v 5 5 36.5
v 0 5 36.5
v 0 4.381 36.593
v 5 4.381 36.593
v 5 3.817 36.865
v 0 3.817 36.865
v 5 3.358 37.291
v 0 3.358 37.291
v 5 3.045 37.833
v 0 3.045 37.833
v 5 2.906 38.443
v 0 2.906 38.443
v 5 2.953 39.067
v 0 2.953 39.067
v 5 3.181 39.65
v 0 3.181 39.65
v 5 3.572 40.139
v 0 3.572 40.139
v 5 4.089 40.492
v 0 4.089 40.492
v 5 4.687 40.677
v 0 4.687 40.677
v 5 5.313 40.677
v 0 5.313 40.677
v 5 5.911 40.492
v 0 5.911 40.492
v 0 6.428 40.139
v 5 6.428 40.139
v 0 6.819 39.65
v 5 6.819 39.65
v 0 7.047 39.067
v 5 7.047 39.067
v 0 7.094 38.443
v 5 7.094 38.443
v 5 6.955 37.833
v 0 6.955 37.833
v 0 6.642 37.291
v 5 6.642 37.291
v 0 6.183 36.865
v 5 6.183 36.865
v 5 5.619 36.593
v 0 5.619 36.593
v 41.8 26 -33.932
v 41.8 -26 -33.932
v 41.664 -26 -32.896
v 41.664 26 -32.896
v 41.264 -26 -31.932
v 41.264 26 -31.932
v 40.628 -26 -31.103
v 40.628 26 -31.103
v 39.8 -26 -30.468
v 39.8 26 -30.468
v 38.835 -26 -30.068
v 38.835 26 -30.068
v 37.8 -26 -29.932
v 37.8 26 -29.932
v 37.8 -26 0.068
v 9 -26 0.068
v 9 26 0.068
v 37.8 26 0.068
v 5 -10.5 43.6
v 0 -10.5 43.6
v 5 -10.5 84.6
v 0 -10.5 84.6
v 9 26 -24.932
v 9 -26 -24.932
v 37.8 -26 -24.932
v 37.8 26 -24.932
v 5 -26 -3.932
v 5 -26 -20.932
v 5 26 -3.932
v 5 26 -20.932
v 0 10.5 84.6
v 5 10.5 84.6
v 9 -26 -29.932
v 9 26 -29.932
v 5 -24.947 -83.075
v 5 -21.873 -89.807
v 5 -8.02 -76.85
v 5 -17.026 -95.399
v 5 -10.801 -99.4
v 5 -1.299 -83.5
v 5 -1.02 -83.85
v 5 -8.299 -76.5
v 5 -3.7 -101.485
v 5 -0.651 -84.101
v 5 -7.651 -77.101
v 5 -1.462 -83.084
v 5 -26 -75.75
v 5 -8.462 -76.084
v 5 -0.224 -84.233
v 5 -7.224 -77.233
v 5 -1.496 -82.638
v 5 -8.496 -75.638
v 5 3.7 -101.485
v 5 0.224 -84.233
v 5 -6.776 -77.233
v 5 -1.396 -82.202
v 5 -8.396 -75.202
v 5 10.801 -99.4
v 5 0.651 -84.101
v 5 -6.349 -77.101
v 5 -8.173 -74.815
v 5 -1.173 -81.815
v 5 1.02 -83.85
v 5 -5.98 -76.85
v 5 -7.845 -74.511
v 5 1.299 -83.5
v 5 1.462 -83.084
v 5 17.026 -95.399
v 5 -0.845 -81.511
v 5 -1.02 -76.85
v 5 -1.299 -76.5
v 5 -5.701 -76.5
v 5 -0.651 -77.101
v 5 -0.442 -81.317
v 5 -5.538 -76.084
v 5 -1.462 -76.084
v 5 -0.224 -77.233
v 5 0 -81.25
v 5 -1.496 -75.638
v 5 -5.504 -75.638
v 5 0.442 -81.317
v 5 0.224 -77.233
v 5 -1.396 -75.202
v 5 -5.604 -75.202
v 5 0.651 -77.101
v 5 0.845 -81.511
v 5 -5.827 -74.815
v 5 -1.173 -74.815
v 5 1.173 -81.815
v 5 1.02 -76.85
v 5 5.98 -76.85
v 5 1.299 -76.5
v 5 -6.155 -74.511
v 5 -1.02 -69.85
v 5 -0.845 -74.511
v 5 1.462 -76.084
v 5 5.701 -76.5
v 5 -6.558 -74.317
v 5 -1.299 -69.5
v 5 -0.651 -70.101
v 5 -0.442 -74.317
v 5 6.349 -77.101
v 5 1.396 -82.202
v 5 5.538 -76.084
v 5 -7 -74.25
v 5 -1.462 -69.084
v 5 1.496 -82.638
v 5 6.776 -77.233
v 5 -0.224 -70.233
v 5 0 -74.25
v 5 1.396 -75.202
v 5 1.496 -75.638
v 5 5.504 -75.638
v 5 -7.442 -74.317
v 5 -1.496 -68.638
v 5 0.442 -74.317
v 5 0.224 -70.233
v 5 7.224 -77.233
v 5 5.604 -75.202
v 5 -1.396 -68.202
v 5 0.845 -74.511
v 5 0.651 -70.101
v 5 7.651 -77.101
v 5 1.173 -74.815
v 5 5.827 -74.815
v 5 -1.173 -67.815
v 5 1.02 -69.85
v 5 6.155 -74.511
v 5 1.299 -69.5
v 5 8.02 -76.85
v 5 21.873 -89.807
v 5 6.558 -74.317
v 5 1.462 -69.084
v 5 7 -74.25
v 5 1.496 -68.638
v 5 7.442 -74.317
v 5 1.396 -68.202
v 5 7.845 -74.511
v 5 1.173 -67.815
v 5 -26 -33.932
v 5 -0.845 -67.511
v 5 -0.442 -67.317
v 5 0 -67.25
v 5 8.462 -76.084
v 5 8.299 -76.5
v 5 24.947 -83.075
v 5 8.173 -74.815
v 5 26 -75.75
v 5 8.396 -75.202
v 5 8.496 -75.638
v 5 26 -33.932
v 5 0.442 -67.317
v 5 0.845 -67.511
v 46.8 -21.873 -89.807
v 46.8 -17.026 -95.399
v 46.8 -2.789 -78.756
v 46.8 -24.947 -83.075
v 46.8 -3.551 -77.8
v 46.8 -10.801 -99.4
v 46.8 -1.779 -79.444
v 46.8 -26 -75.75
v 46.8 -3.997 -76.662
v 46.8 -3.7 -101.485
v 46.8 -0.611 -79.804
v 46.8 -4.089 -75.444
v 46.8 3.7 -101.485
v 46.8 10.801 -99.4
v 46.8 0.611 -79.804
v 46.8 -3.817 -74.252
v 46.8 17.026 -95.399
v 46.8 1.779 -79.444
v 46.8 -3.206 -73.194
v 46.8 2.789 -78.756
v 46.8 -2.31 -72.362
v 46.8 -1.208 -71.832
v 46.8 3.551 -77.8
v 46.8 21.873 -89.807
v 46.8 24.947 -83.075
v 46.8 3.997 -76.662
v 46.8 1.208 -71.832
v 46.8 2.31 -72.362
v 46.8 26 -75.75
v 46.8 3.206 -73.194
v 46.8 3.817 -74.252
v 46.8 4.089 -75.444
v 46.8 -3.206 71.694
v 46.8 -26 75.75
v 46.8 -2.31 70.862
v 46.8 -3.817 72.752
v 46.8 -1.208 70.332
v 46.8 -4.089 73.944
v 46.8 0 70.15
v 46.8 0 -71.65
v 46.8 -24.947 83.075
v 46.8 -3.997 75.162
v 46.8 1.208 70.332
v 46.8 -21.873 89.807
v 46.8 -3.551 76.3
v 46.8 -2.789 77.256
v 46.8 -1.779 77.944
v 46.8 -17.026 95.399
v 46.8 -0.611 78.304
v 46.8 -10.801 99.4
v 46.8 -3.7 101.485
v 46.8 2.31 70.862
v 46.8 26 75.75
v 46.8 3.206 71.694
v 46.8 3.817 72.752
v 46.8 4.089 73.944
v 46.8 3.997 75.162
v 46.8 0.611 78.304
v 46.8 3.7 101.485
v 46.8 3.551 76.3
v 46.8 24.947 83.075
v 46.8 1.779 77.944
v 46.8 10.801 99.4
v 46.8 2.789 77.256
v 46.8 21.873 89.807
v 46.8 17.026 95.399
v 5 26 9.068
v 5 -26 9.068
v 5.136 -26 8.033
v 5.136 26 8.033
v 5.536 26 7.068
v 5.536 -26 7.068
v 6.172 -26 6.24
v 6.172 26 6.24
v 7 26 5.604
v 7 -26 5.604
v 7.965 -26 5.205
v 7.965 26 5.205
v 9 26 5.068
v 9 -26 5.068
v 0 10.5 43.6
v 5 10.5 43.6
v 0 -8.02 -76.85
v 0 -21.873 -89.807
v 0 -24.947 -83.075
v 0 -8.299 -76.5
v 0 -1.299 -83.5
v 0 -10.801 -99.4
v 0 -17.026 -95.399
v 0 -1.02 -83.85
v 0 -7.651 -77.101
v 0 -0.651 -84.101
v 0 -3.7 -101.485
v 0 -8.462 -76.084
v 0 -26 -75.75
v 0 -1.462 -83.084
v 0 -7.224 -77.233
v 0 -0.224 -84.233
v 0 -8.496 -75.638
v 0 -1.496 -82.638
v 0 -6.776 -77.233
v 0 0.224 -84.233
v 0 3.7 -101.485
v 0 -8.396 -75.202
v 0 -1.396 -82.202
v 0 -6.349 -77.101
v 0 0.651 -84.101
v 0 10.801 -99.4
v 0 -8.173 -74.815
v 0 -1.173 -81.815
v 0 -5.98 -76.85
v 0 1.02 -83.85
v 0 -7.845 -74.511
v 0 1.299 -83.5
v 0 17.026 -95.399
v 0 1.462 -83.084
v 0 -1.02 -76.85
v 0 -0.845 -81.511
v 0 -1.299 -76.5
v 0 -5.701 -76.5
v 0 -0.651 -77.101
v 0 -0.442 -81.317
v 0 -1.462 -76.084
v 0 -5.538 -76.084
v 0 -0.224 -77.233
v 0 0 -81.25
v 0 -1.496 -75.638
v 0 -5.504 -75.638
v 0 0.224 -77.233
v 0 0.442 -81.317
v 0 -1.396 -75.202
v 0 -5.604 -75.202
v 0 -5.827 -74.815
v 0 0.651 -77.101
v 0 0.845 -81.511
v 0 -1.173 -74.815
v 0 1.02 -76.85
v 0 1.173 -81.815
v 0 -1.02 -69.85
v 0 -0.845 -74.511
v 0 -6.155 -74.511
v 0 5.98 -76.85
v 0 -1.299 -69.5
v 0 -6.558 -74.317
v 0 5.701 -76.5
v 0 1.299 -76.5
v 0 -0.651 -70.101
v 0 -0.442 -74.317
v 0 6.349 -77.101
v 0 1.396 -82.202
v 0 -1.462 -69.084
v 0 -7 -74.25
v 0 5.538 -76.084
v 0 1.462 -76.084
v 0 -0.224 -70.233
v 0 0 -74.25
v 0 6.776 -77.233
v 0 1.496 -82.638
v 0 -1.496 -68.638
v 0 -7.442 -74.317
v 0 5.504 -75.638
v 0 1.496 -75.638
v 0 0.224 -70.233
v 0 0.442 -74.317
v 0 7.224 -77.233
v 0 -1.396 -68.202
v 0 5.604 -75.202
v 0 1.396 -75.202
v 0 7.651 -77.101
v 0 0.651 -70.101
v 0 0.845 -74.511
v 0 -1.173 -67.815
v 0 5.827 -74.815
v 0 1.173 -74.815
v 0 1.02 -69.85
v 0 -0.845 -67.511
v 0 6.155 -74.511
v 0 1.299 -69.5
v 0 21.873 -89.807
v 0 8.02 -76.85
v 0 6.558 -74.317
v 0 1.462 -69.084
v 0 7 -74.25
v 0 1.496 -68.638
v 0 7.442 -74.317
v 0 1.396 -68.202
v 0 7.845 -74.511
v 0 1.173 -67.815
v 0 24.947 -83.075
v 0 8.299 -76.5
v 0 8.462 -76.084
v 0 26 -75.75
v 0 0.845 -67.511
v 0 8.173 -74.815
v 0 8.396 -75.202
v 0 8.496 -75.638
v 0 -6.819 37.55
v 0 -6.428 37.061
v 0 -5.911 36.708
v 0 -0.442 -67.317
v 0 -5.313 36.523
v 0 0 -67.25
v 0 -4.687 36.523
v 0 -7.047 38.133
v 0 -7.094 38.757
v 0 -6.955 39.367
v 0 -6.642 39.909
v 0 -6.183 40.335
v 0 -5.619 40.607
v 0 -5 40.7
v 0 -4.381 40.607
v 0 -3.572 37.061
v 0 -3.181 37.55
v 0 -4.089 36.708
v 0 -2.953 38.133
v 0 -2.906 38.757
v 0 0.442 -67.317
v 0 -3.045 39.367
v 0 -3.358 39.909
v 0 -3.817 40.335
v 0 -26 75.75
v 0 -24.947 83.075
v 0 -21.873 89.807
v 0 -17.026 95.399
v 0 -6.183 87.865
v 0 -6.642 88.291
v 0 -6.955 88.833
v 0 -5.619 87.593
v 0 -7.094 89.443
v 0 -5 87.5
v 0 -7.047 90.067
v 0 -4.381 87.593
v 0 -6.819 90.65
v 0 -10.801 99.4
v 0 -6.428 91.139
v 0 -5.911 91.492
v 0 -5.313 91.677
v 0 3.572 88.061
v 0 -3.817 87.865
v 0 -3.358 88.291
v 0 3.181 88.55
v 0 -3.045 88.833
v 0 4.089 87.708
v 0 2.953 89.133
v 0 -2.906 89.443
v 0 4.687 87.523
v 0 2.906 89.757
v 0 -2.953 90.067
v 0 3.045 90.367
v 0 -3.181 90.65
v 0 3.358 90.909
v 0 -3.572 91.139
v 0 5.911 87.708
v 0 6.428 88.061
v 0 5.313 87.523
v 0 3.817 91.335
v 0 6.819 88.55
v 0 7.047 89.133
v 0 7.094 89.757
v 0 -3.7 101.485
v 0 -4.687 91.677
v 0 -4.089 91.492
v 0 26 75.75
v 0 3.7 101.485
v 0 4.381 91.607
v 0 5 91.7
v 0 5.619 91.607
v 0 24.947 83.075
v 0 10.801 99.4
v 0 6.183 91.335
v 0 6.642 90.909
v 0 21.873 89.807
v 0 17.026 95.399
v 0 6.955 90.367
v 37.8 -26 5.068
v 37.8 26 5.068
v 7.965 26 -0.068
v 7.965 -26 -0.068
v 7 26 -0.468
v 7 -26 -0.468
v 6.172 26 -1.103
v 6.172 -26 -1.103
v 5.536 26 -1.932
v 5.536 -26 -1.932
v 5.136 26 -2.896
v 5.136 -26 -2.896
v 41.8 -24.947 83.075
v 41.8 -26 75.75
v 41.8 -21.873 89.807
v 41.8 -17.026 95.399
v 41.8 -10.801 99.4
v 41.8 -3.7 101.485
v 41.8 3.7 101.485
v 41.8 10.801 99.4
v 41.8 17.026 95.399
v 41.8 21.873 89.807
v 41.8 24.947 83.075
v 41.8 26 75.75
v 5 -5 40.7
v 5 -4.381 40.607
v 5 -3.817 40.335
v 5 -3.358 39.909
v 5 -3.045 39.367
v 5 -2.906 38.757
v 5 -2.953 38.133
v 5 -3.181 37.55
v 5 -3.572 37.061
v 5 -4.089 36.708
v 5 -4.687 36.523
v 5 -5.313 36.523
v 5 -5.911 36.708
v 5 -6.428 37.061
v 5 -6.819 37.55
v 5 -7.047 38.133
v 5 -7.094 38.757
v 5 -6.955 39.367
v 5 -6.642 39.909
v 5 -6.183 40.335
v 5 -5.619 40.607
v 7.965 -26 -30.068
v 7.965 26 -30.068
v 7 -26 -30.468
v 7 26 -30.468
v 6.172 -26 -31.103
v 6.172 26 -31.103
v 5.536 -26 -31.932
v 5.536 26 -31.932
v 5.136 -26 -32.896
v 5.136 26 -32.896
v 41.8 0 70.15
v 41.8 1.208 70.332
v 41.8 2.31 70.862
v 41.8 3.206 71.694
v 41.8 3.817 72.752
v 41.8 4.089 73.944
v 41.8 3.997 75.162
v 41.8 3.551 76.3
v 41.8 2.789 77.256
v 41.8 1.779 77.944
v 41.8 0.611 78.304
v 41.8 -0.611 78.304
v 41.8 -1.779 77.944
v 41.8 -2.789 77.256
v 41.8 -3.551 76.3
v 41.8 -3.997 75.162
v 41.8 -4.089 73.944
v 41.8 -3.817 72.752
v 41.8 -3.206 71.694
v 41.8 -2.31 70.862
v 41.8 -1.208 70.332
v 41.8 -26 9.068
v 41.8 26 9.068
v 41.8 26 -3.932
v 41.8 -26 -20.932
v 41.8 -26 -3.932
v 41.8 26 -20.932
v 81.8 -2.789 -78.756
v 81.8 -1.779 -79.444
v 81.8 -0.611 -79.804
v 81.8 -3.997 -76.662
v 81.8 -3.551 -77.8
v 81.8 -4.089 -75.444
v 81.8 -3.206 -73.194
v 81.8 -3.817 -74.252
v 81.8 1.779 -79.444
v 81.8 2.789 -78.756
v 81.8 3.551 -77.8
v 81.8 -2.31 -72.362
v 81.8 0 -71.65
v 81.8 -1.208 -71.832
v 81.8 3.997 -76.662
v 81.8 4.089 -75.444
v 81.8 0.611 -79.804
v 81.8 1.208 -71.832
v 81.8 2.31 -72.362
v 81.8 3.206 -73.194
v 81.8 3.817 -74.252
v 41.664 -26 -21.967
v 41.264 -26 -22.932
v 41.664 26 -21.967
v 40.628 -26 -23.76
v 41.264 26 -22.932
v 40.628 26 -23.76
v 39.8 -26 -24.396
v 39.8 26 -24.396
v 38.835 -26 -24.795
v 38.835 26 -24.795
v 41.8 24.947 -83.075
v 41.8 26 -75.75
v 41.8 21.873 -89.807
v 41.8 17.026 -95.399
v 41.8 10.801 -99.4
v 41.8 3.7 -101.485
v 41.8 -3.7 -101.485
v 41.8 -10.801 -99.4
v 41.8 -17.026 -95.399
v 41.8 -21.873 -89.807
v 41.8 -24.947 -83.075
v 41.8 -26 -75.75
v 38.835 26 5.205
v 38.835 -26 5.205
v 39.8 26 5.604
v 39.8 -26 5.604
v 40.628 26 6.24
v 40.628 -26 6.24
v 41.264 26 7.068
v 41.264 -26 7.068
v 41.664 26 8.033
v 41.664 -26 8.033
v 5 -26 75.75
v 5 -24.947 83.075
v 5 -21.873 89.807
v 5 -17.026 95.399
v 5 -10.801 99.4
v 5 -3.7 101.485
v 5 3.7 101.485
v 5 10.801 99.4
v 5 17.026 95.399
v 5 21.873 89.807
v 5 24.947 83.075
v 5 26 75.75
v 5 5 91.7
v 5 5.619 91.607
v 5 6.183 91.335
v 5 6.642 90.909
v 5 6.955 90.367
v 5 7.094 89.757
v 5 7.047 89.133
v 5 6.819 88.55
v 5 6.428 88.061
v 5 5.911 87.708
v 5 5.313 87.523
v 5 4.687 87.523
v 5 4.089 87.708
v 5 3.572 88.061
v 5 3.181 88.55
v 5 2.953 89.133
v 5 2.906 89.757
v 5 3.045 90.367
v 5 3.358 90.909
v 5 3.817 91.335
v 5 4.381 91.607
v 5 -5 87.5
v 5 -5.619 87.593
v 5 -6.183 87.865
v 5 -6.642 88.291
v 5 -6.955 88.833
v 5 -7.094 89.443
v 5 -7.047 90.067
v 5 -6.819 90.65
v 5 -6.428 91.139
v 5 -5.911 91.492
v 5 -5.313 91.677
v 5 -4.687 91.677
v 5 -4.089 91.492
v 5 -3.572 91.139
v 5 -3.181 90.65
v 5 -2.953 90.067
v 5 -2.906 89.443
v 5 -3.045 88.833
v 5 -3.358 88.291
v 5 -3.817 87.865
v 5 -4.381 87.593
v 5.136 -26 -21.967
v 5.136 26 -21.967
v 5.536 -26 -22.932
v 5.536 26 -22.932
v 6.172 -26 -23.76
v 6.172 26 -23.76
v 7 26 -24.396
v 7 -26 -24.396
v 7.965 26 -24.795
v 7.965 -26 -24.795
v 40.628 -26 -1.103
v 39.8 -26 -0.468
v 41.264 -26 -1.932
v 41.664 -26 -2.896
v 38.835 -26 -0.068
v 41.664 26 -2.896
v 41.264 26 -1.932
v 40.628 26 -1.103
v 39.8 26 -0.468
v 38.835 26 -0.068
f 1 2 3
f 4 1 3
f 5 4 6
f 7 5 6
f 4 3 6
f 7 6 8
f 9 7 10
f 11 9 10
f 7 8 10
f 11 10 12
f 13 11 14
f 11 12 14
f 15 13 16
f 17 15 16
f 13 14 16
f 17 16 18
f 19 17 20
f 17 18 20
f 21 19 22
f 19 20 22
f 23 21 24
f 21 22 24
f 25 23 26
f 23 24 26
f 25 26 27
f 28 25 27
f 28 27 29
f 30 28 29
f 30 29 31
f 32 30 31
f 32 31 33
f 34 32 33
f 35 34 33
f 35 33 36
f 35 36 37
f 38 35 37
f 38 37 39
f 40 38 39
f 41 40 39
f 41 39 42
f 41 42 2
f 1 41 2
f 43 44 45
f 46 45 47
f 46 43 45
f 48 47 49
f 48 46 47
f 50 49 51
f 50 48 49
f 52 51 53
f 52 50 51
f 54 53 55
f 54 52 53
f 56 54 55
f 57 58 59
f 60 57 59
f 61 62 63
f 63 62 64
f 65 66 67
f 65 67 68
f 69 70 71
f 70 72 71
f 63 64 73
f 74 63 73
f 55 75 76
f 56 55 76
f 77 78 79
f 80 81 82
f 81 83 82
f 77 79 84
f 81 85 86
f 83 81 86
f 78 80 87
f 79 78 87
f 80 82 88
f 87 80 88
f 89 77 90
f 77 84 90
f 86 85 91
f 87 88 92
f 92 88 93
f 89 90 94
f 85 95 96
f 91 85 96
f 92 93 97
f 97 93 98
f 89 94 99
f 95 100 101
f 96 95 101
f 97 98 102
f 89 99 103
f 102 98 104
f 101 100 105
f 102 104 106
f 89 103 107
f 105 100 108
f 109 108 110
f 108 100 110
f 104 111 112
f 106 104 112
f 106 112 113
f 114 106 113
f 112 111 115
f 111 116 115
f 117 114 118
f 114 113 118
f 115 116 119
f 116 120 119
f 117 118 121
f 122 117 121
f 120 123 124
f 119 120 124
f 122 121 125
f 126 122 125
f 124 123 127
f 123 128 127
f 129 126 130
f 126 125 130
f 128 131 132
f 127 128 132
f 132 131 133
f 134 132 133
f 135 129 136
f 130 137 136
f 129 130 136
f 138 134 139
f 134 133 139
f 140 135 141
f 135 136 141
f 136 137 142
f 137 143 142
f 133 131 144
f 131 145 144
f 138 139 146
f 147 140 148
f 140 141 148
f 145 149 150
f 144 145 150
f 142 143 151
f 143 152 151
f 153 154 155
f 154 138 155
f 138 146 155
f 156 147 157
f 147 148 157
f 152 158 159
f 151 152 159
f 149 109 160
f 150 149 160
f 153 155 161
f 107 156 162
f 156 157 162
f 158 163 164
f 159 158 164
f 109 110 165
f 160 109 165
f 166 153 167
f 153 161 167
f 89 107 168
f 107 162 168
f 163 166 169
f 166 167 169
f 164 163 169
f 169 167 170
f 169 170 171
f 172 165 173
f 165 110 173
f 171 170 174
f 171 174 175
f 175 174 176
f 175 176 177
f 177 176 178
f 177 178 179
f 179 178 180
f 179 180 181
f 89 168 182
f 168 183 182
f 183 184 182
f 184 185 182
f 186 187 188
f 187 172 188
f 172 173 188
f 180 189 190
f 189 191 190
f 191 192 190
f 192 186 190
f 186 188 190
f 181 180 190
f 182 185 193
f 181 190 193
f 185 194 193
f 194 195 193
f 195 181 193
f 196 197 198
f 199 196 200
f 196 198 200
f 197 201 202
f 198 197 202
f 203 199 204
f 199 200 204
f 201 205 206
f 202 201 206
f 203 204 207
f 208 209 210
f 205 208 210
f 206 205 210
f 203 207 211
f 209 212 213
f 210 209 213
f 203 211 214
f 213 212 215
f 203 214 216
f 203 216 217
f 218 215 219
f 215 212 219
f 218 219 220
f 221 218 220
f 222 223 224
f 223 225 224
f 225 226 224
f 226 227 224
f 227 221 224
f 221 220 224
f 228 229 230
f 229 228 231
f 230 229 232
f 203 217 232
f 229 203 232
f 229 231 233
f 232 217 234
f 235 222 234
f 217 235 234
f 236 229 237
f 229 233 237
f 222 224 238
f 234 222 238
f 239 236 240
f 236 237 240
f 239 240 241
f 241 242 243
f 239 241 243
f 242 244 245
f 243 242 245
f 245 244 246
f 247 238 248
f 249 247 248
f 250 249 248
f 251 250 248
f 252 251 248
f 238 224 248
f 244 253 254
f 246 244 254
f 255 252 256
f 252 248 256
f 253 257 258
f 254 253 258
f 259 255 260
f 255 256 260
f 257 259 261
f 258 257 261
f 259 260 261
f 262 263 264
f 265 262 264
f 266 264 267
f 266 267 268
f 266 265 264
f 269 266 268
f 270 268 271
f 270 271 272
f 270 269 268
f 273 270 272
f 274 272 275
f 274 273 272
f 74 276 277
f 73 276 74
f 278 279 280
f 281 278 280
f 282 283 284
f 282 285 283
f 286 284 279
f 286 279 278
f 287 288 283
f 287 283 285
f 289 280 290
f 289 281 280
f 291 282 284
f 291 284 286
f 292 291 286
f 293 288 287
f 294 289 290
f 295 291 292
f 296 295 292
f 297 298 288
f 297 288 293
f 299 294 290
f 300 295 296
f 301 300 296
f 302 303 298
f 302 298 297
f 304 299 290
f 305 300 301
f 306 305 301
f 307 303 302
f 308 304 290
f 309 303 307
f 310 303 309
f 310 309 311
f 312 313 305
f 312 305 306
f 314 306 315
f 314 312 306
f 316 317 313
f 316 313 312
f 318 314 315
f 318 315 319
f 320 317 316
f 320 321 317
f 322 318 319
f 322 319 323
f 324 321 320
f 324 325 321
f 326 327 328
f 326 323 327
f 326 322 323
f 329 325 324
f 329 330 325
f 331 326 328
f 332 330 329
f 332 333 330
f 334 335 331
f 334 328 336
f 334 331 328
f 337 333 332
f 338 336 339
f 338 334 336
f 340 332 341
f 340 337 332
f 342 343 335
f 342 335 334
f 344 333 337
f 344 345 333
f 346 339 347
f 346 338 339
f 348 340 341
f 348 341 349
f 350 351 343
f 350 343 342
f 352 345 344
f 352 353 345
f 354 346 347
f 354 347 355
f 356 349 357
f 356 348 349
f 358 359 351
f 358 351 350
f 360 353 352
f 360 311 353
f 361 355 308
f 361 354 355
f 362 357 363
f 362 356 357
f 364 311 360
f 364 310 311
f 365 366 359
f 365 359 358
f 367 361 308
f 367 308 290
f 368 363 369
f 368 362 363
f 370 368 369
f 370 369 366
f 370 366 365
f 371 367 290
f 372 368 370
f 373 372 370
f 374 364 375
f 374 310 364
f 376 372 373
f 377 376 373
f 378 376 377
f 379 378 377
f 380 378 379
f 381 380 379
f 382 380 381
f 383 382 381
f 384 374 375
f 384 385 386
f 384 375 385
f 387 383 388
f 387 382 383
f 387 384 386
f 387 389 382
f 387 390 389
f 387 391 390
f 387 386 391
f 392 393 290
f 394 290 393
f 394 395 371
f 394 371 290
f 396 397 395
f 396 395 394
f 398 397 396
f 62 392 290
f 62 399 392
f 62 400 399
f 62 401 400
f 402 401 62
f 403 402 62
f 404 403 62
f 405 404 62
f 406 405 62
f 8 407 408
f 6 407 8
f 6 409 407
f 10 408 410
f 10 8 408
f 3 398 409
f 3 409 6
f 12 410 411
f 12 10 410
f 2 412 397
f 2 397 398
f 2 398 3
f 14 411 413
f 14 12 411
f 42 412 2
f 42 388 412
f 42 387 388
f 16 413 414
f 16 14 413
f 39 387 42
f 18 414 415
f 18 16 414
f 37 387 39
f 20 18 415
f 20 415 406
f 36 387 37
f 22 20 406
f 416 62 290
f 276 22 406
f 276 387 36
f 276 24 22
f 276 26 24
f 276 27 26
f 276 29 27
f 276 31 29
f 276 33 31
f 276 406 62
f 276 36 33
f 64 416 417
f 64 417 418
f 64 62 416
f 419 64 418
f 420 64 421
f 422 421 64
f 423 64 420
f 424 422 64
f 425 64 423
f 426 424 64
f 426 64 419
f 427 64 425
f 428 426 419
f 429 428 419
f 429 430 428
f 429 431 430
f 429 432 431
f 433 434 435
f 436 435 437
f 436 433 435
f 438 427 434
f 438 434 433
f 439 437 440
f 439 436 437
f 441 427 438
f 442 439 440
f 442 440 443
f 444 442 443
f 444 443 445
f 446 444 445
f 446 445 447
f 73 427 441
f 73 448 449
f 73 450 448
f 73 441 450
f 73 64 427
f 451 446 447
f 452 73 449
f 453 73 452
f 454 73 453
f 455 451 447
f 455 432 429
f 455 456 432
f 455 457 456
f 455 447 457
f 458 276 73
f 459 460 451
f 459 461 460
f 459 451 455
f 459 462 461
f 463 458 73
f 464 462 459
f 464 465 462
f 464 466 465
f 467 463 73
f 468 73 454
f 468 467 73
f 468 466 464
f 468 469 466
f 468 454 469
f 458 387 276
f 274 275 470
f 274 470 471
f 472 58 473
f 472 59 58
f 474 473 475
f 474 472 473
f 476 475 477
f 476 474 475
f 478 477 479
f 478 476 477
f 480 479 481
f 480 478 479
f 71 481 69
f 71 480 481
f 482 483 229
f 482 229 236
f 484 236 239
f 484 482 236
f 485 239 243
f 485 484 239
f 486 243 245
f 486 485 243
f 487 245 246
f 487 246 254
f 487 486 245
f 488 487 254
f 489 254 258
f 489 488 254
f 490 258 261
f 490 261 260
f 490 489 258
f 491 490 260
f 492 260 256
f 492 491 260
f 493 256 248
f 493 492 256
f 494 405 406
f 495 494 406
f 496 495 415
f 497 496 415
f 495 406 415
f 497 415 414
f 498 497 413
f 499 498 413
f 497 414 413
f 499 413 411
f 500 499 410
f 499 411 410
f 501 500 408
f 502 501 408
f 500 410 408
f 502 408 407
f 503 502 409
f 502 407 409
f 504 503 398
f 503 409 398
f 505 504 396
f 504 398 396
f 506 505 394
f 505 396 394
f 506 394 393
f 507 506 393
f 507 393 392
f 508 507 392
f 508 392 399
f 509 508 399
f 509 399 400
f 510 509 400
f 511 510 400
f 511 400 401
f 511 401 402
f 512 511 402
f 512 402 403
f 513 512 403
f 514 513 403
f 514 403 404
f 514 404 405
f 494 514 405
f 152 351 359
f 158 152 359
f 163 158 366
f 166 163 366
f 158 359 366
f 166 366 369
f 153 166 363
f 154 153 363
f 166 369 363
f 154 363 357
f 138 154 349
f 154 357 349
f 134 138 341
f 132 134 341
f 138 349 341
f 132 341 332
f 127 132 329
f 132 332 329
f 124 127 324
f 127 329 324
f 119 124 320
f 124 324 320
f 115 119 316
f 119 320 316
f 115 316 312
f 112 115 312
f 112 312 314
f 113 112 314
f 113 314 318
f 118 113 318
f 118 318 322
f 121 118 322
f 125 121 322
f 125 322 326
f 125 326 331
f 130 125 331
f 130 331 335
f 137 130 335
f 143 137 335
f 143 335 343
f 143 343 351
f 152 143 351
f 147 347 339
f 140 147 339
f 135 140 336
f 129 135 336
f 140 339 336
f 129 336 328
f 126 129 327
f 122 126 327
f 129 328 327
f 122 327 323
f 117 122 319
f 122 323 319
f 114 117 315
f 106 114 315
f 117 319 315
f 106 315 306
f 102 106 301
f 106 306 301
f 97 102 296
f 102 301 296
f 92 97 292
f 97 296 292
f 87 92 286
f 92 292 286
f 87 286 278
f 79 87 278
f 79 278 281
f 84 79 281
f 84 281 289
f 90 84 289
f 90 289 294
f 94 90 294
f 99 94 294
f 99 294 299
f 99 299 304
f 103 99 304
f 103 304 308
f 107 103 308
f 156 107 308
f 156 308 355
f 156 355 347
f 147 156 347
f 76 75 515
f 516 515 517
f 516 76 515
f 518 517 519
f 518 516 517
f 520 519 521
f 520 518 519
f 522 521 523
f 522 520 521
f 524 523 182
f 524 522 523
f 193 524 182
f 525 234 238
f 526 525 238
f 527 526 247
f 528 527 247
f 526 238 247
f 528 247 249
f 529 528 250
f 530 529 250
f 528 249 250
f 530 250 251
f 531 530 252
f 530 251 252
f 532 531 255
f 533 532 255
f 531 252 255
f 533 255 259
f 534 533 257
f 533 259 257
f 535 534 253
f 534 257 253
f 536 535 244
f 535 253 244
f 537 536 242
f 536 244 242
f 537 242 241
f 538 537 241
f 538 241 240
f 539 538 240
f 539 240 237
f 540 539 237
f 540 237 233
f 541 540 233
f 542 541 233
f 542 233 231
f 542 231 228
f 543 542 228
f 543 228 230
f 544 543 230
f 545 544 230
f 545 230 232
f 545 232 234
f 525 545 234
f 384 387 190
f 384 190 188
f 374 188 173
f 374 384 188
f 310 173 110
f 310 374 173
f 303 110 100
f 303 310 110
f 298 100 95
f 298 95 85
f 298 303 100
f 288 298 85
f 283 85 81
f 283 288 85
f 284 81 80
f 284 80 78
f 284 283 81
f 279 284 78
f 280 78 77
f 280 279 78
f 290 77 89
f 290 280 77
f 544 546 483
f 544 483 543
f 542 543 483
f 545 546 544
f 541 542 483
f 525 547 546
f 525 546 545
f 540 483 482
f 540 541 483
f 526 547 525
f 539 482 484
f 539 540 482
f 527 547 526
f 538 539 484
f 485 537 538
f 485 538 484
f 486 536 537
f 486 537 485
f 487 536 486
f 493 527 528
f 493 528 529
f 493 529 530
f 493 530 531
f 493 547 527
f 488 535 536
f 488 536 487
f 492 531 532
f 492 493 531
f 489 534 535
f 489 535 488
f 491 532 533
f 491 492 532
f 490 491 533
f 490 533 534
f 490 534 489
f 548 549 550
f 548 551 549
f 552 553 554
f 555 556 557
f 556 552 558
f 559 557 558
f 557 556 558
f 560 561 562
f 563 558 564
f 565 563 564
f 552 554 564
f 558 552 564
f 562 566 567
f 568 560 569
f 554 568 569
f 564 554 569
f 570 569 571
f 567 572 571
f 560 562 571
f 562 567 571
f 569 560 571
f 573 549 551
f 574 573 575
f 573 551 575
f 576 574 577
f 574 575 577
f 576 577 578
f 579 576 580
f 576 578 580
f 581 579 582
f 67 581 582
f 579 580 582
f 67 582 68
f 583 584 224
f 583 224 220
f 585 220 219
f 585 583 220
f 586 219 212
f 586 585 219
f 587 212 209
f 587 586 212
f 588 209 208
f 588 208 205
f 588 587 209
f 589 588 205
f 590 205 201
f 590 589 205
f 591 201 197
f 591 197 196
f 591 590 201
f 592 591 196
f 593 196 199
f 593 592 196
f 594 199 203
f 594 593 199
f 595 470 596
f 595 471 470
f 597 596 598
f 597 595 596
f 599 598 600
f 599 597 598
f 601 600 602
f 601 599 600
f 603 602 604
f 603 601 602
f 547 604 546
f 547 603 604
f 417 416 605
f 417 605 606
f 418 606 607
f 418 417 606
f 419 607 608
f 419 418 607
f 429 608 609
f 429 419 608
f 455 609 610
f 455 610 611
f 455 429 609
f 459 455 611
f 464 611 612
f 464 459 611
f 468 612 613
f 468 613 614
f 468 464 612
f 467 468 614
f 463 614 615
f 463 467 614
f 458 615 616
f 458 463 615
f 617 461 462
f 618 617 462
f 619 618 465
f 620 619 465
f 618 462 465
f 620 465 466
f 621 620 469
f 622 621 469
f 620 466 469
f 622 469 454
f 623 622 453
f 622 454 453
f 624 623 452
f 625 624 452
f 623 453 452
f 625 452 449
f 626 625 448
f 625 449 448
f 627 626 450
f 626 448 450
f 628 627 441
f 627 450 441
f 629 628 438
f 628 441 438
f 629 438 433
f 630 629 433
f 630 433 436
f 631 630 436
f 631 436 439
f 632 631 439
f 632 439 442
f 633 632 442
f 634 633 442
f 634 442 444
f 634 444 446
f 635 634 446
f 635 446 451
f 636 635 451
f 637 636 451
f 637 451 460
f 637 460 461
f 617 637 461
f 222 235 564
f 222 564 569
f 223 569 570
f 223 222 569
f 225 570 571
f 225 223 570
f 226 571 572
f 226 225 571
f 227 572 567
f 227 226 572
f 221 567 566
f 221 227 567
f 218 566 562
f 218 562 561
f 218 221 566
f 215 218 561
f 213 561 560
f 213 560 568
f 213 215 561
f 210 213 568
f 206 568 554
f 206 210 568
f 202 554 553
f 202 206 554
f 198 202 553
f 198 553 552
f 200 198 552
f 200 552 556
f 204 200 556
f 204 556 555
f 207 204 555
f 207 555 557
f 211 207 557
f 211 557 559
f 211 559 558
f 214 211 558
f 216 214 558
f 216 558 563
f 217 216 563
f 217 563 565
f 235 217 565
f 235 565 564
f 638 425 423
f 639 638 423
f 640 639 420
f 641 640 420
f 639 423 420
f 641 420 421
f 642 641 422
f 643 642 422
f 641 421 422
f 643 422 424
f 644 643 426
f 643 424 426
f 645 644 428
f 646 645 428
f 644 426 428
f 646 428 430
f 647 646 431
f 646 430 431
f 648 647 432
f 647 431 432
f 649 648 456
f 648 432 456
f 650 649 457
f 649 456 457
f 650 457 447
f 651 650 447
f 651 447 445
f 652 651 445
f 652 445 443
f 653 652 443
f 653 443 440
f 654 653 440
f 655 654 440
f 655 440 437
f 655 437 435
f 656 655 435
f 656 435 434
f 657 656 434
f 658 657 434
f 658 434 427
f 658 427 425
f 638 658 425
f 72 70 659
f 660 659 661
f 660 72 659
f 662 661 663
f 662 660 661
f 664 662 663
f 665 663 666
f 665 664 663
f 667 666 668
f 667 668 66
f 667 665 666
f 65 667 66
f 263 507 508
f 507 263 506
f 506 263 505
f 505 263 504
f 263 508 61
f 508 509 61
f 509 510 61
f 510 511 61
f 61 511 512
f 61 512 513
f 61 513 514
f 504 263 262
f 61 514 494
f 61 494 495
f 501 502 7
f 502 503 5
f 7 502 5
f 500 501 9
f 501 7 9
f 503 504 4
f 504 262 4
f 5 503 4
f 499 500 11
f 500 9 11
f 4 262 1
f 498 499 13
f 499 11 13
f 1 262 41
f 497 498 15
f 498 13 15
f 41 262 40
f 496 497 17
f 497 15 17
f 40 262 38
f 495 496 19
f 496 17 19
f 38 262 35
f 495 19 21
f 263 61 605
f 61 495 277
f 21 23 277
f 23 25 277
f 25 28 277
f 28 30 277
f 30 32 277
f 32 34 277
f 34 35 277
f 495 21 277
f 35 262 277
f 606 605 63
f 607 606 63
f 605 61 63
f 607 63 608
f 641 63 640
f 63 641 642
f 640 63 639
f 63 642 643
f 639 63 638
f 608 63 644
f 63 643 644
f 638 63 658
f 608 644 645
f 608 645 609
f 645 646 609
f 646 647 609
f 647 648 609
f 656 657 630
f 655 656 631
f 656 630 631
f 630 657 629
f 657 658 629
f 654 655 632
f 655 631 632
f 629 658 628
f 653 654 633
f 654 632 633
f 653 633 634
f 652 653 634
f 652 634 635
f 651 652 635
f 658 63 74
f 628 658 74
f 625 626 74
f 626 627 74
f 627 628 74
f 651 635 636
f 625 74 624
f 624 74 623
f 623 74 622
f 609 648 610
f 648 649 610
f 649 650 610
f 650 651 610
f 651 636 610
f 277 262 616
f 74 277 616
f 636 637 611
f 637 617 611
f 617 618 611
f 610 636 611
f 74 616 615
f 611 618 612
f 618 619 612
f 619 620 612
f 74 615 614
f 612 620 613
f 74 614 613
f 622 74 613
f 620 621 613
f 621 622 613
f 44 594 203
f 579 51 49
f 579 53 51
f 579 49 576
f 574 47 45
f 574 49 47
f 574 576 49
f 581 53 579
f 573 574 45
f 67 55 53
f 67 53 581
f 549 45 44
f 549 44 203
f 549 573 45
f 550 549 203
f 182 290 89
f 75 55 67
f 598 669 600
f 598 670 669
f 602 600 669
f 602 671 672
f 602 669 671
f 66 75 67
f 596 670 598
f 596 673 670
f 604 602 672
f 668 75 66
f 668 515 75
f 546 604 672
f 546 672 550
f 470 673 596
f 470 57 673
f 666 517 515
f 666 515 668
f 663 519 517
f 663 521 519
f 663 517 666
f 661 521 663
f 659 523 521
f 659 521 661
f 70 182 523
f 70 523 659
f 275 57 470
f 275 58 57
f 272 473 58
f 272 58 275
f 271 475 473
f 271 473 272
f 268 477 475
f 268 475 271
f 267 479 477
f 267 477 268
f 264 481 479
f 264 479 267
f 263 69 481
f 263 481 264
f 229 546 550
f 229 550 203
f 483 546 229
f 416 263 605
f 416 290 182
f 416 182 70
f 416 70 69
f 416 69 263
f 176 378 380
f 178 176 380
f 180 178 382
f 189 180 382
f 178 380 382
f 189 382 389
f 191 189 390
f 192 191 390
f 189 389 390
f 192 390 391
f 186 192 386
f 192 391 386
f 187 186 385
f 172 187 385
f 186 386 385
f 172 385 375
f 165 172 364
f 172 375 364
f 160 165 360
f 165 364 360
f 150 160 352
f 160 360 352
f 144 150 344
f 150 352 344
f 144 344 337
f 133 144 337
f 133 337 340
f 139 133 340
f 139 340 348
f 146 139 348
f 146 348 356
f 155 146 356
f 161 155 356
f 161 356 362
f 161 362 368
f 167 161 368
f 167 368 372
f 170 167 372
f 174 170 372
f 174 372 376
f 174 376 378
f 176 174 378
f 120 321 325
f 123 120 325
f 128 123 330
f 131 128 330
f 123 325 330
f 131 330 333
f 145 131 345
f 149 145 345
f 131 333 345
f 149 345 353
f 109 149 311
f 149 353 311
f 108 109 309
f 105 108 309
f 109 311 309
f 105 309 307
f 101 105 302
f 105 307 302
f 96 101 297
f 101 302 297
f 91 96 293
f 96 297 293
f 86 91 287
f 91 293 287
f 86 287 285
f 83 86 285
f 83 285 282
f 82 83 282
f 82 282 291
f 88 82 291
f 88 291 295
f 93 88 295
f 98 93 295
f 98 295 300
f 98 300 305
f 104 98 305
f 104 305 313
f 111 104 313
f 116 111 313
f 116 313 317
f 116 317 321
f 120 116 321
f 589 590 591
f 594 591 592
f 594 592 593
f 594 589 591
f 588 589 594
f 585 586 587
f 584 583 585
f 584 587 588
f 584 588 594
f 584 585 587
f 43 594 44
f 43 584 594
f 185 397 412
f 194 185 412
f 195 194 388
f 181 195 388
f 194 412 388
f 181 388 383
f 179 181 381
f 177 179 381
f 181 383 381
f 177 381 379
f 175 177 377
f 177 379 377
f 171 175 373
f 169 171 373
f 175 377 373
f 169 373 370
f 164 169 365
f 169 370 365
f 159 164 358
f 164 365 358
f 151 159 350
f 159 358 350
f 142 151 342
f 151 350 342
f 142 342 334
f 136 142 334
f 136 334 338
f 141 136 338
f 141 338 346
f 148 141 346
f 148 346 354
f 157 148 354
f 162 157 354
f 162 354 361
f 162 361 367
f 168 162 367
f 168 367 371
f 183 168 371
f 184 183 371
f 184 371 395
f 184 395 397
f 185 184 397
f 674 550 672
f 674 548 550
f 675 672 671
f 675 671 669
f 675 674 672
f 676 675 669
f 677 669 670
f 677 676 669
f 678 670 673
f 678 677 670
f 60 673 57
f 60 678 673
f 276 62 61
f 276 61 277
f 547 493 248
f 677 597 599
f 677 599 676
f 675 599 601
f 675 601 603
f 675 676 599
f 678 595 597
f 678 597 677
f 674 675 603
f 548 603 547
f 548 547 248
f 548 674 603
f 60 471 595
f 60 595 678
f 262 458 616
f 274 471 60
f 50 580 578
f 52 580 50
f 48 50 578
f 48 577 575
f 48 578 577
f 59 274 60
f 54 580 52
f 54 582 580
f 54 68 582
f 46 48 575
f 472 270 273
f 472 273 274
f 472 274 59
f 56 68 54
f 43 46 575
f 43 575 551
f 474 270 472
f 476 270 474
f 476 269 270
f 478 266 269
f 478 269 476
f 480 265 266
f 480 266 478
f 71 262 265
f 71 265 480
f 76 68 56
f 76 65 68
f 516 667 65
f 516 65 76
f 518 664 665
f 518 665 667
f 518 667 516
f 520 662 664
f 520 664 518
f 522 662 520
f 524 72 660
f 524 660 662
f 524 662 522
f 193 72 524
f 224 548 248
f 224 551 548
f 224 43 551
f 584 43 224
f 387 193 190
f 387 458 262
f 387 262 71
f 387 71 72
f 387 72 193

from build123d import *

# Parameters (mm, degrees)
BOSS_EXTRUDE3_DEPTH = 5
SKETCH4_R           = 1.5
CUT_EXTRUDE1_DEPTH  = 70
SKETCH5_R           = 2.1
SKETCH5_W           = 41
SKETCH5_H           = 21
CUT_EXTRUDE2_DEPTH  = 10
SKETCH6_W           = 5
SKETCH6_H           = 52
BOSS_EXTRUDE4_DEPTH = 36.8
BOSS_EXTRUDE5_DEPTH = 5
SKETCH8_R           = 4.1
BOSS_EXTRUDE6_DEPTH = 40
SKETCH10_R          = 4.1
CUT_EXTRUDE5_DEPTH  = 25
FILLET2_R           = 4


with BuildPart() as part:
    # Sketch3 → Boss-Extrude3 (new body)
    with BuildSketch(Plane(origin=(0, 0, 0), x_dir=(0, 0, -1), z_dir=(1, 0, 0))):
        with BuildLine():
            Line((-75.75, 26), (75.75, 26))
            ThreePointArc((75.75, 26), (101.75, 0), (75.75, -26))
            Line((75.75, -26), (-75.75, -26))
            ThreePointArc((-75.75, -26), (-101.75, 0), (-75.75, 26))
        make_face()
    extrude(amount=BOSS_EXTRUDE3_DEPTH)

    # Sketch4 → Cut-Extrude1 (cut)
    with BuildSketch(Plane.ZY):
        with Locations((-75.75, 0)):
            Circle(SKETCH4_R)
        with Locations((-75.75, 7)):
            Circle(SKETCH4_R)
        with Locations((-68.75, 0)):
            Circle(SKETCH4_R)
        with Locations((-75.75, -7)):
            Circle(SKETCH4_R)
        with Locations((-82.75, 0)):
            Circle(SKETCH4_R)
    extrude(amount=-CUT_EXTRUDE1_DEPTH, mode=Mode.SUBTRACT)

    # Sketch5 → Cut-Extrude2 (cut)
    with BuildSketch(Plane.ZY):
        with Locations((89.6, 5)):
            Circle(SKETCH5_R)
        with Locations(Location((89.6, -5, 0), (0, 0, 180))):
            Circle(SKETCH5_R)
        with Locations((38.6, -5)):
            Circle(SKETCH5_R)
        with Locations(Location((38.6, 5, 0), (0, 0, 180))):
            Circle(SKETCH5_R)
        with Locations((64.1, 0)):
            Rectangle(SKETCH5_W, SKETCH5_H)
    extrude(amount=-CUT_EXTRUDE2_DEPTH, mode=Mode.SUBTRACT)

    # Sketch6 → Boss-Extrude4 (add)
    with BuildSketch(Plane(origin=(5, 0, 0), x_dir=(0, 0, -1), z_dir=(1, 0, 0))):
        with Locations((27.431638641, 0)):
            Rectangle(SKETCH6_W, SKETCH6_H)
        with Locations((-2.568361359, 0)):
            Rectangle(SKETCH6_W, SKETCH6_H)
    extrude(amount=BOSS_EXTRUDE4_DEPTH)

    # Sketch7 → Boss-Extrude5 (add)
    with BuildSketch(Plane(origin=(41.8, 0, 0), x_dir=(0, 0, -1), z_dir=(1, 0, 0))):
        with BuildLine():
            Line((-75.75, 26), (75.75, 26))
            ThreePointArc((75.75, 26), (101.75, 0), (75.75, -26))
            Line((75.75, -26), (-75.75, -26))
            ThreePointArc((-75.75, -26), (-101.75, 0), (-75.75, 26))
        make_face()
    extrude(amount=BOSS_EXTRUDE5_DEPTH)

    # Sketch8 → Boss-Extrude6 (add)
    with BuildSketch(Plane.ZY.offset(-41.8)):
        with Locations((-75.75, 0)):
            Circle(SKETCH8_R)
    extrude(amount=-BOSS_EXTRUDE6_DEPTH)

    # Sketch10 → Cut-Extrude5 (cut)
    with BuildSketch(Plane(origin=(46.8, 0, 0), x_dir=(0, 0, -1), z_dir=(1, 0, 0))):
        with Locations((-74.25, 0)):
            Circle(SKETCH10_R)
    extrude(amount=-CUT_EXTRUDE5_DEPTH, mode=Mode.SUBTRACT)

    # Fillet2
    fillet2_edges = [part.edges().sort_by_distance(p)[0] for p in [
        (41.8, 0, 5.068361359),
        (41.8, 0, 0.068361359),
        (5, 0, -29.931638641),
        (5, 0, -24.931638641),
        (41.8, 0, -29.931638641),
        (41.8, 0, -24.931638641),
        (5, 0, 5.068361359),
        (5, 0, 0.068361359),
    ]]
    fillet(fillet2_edges, radius=FILLET2_R)


solid = part.part
